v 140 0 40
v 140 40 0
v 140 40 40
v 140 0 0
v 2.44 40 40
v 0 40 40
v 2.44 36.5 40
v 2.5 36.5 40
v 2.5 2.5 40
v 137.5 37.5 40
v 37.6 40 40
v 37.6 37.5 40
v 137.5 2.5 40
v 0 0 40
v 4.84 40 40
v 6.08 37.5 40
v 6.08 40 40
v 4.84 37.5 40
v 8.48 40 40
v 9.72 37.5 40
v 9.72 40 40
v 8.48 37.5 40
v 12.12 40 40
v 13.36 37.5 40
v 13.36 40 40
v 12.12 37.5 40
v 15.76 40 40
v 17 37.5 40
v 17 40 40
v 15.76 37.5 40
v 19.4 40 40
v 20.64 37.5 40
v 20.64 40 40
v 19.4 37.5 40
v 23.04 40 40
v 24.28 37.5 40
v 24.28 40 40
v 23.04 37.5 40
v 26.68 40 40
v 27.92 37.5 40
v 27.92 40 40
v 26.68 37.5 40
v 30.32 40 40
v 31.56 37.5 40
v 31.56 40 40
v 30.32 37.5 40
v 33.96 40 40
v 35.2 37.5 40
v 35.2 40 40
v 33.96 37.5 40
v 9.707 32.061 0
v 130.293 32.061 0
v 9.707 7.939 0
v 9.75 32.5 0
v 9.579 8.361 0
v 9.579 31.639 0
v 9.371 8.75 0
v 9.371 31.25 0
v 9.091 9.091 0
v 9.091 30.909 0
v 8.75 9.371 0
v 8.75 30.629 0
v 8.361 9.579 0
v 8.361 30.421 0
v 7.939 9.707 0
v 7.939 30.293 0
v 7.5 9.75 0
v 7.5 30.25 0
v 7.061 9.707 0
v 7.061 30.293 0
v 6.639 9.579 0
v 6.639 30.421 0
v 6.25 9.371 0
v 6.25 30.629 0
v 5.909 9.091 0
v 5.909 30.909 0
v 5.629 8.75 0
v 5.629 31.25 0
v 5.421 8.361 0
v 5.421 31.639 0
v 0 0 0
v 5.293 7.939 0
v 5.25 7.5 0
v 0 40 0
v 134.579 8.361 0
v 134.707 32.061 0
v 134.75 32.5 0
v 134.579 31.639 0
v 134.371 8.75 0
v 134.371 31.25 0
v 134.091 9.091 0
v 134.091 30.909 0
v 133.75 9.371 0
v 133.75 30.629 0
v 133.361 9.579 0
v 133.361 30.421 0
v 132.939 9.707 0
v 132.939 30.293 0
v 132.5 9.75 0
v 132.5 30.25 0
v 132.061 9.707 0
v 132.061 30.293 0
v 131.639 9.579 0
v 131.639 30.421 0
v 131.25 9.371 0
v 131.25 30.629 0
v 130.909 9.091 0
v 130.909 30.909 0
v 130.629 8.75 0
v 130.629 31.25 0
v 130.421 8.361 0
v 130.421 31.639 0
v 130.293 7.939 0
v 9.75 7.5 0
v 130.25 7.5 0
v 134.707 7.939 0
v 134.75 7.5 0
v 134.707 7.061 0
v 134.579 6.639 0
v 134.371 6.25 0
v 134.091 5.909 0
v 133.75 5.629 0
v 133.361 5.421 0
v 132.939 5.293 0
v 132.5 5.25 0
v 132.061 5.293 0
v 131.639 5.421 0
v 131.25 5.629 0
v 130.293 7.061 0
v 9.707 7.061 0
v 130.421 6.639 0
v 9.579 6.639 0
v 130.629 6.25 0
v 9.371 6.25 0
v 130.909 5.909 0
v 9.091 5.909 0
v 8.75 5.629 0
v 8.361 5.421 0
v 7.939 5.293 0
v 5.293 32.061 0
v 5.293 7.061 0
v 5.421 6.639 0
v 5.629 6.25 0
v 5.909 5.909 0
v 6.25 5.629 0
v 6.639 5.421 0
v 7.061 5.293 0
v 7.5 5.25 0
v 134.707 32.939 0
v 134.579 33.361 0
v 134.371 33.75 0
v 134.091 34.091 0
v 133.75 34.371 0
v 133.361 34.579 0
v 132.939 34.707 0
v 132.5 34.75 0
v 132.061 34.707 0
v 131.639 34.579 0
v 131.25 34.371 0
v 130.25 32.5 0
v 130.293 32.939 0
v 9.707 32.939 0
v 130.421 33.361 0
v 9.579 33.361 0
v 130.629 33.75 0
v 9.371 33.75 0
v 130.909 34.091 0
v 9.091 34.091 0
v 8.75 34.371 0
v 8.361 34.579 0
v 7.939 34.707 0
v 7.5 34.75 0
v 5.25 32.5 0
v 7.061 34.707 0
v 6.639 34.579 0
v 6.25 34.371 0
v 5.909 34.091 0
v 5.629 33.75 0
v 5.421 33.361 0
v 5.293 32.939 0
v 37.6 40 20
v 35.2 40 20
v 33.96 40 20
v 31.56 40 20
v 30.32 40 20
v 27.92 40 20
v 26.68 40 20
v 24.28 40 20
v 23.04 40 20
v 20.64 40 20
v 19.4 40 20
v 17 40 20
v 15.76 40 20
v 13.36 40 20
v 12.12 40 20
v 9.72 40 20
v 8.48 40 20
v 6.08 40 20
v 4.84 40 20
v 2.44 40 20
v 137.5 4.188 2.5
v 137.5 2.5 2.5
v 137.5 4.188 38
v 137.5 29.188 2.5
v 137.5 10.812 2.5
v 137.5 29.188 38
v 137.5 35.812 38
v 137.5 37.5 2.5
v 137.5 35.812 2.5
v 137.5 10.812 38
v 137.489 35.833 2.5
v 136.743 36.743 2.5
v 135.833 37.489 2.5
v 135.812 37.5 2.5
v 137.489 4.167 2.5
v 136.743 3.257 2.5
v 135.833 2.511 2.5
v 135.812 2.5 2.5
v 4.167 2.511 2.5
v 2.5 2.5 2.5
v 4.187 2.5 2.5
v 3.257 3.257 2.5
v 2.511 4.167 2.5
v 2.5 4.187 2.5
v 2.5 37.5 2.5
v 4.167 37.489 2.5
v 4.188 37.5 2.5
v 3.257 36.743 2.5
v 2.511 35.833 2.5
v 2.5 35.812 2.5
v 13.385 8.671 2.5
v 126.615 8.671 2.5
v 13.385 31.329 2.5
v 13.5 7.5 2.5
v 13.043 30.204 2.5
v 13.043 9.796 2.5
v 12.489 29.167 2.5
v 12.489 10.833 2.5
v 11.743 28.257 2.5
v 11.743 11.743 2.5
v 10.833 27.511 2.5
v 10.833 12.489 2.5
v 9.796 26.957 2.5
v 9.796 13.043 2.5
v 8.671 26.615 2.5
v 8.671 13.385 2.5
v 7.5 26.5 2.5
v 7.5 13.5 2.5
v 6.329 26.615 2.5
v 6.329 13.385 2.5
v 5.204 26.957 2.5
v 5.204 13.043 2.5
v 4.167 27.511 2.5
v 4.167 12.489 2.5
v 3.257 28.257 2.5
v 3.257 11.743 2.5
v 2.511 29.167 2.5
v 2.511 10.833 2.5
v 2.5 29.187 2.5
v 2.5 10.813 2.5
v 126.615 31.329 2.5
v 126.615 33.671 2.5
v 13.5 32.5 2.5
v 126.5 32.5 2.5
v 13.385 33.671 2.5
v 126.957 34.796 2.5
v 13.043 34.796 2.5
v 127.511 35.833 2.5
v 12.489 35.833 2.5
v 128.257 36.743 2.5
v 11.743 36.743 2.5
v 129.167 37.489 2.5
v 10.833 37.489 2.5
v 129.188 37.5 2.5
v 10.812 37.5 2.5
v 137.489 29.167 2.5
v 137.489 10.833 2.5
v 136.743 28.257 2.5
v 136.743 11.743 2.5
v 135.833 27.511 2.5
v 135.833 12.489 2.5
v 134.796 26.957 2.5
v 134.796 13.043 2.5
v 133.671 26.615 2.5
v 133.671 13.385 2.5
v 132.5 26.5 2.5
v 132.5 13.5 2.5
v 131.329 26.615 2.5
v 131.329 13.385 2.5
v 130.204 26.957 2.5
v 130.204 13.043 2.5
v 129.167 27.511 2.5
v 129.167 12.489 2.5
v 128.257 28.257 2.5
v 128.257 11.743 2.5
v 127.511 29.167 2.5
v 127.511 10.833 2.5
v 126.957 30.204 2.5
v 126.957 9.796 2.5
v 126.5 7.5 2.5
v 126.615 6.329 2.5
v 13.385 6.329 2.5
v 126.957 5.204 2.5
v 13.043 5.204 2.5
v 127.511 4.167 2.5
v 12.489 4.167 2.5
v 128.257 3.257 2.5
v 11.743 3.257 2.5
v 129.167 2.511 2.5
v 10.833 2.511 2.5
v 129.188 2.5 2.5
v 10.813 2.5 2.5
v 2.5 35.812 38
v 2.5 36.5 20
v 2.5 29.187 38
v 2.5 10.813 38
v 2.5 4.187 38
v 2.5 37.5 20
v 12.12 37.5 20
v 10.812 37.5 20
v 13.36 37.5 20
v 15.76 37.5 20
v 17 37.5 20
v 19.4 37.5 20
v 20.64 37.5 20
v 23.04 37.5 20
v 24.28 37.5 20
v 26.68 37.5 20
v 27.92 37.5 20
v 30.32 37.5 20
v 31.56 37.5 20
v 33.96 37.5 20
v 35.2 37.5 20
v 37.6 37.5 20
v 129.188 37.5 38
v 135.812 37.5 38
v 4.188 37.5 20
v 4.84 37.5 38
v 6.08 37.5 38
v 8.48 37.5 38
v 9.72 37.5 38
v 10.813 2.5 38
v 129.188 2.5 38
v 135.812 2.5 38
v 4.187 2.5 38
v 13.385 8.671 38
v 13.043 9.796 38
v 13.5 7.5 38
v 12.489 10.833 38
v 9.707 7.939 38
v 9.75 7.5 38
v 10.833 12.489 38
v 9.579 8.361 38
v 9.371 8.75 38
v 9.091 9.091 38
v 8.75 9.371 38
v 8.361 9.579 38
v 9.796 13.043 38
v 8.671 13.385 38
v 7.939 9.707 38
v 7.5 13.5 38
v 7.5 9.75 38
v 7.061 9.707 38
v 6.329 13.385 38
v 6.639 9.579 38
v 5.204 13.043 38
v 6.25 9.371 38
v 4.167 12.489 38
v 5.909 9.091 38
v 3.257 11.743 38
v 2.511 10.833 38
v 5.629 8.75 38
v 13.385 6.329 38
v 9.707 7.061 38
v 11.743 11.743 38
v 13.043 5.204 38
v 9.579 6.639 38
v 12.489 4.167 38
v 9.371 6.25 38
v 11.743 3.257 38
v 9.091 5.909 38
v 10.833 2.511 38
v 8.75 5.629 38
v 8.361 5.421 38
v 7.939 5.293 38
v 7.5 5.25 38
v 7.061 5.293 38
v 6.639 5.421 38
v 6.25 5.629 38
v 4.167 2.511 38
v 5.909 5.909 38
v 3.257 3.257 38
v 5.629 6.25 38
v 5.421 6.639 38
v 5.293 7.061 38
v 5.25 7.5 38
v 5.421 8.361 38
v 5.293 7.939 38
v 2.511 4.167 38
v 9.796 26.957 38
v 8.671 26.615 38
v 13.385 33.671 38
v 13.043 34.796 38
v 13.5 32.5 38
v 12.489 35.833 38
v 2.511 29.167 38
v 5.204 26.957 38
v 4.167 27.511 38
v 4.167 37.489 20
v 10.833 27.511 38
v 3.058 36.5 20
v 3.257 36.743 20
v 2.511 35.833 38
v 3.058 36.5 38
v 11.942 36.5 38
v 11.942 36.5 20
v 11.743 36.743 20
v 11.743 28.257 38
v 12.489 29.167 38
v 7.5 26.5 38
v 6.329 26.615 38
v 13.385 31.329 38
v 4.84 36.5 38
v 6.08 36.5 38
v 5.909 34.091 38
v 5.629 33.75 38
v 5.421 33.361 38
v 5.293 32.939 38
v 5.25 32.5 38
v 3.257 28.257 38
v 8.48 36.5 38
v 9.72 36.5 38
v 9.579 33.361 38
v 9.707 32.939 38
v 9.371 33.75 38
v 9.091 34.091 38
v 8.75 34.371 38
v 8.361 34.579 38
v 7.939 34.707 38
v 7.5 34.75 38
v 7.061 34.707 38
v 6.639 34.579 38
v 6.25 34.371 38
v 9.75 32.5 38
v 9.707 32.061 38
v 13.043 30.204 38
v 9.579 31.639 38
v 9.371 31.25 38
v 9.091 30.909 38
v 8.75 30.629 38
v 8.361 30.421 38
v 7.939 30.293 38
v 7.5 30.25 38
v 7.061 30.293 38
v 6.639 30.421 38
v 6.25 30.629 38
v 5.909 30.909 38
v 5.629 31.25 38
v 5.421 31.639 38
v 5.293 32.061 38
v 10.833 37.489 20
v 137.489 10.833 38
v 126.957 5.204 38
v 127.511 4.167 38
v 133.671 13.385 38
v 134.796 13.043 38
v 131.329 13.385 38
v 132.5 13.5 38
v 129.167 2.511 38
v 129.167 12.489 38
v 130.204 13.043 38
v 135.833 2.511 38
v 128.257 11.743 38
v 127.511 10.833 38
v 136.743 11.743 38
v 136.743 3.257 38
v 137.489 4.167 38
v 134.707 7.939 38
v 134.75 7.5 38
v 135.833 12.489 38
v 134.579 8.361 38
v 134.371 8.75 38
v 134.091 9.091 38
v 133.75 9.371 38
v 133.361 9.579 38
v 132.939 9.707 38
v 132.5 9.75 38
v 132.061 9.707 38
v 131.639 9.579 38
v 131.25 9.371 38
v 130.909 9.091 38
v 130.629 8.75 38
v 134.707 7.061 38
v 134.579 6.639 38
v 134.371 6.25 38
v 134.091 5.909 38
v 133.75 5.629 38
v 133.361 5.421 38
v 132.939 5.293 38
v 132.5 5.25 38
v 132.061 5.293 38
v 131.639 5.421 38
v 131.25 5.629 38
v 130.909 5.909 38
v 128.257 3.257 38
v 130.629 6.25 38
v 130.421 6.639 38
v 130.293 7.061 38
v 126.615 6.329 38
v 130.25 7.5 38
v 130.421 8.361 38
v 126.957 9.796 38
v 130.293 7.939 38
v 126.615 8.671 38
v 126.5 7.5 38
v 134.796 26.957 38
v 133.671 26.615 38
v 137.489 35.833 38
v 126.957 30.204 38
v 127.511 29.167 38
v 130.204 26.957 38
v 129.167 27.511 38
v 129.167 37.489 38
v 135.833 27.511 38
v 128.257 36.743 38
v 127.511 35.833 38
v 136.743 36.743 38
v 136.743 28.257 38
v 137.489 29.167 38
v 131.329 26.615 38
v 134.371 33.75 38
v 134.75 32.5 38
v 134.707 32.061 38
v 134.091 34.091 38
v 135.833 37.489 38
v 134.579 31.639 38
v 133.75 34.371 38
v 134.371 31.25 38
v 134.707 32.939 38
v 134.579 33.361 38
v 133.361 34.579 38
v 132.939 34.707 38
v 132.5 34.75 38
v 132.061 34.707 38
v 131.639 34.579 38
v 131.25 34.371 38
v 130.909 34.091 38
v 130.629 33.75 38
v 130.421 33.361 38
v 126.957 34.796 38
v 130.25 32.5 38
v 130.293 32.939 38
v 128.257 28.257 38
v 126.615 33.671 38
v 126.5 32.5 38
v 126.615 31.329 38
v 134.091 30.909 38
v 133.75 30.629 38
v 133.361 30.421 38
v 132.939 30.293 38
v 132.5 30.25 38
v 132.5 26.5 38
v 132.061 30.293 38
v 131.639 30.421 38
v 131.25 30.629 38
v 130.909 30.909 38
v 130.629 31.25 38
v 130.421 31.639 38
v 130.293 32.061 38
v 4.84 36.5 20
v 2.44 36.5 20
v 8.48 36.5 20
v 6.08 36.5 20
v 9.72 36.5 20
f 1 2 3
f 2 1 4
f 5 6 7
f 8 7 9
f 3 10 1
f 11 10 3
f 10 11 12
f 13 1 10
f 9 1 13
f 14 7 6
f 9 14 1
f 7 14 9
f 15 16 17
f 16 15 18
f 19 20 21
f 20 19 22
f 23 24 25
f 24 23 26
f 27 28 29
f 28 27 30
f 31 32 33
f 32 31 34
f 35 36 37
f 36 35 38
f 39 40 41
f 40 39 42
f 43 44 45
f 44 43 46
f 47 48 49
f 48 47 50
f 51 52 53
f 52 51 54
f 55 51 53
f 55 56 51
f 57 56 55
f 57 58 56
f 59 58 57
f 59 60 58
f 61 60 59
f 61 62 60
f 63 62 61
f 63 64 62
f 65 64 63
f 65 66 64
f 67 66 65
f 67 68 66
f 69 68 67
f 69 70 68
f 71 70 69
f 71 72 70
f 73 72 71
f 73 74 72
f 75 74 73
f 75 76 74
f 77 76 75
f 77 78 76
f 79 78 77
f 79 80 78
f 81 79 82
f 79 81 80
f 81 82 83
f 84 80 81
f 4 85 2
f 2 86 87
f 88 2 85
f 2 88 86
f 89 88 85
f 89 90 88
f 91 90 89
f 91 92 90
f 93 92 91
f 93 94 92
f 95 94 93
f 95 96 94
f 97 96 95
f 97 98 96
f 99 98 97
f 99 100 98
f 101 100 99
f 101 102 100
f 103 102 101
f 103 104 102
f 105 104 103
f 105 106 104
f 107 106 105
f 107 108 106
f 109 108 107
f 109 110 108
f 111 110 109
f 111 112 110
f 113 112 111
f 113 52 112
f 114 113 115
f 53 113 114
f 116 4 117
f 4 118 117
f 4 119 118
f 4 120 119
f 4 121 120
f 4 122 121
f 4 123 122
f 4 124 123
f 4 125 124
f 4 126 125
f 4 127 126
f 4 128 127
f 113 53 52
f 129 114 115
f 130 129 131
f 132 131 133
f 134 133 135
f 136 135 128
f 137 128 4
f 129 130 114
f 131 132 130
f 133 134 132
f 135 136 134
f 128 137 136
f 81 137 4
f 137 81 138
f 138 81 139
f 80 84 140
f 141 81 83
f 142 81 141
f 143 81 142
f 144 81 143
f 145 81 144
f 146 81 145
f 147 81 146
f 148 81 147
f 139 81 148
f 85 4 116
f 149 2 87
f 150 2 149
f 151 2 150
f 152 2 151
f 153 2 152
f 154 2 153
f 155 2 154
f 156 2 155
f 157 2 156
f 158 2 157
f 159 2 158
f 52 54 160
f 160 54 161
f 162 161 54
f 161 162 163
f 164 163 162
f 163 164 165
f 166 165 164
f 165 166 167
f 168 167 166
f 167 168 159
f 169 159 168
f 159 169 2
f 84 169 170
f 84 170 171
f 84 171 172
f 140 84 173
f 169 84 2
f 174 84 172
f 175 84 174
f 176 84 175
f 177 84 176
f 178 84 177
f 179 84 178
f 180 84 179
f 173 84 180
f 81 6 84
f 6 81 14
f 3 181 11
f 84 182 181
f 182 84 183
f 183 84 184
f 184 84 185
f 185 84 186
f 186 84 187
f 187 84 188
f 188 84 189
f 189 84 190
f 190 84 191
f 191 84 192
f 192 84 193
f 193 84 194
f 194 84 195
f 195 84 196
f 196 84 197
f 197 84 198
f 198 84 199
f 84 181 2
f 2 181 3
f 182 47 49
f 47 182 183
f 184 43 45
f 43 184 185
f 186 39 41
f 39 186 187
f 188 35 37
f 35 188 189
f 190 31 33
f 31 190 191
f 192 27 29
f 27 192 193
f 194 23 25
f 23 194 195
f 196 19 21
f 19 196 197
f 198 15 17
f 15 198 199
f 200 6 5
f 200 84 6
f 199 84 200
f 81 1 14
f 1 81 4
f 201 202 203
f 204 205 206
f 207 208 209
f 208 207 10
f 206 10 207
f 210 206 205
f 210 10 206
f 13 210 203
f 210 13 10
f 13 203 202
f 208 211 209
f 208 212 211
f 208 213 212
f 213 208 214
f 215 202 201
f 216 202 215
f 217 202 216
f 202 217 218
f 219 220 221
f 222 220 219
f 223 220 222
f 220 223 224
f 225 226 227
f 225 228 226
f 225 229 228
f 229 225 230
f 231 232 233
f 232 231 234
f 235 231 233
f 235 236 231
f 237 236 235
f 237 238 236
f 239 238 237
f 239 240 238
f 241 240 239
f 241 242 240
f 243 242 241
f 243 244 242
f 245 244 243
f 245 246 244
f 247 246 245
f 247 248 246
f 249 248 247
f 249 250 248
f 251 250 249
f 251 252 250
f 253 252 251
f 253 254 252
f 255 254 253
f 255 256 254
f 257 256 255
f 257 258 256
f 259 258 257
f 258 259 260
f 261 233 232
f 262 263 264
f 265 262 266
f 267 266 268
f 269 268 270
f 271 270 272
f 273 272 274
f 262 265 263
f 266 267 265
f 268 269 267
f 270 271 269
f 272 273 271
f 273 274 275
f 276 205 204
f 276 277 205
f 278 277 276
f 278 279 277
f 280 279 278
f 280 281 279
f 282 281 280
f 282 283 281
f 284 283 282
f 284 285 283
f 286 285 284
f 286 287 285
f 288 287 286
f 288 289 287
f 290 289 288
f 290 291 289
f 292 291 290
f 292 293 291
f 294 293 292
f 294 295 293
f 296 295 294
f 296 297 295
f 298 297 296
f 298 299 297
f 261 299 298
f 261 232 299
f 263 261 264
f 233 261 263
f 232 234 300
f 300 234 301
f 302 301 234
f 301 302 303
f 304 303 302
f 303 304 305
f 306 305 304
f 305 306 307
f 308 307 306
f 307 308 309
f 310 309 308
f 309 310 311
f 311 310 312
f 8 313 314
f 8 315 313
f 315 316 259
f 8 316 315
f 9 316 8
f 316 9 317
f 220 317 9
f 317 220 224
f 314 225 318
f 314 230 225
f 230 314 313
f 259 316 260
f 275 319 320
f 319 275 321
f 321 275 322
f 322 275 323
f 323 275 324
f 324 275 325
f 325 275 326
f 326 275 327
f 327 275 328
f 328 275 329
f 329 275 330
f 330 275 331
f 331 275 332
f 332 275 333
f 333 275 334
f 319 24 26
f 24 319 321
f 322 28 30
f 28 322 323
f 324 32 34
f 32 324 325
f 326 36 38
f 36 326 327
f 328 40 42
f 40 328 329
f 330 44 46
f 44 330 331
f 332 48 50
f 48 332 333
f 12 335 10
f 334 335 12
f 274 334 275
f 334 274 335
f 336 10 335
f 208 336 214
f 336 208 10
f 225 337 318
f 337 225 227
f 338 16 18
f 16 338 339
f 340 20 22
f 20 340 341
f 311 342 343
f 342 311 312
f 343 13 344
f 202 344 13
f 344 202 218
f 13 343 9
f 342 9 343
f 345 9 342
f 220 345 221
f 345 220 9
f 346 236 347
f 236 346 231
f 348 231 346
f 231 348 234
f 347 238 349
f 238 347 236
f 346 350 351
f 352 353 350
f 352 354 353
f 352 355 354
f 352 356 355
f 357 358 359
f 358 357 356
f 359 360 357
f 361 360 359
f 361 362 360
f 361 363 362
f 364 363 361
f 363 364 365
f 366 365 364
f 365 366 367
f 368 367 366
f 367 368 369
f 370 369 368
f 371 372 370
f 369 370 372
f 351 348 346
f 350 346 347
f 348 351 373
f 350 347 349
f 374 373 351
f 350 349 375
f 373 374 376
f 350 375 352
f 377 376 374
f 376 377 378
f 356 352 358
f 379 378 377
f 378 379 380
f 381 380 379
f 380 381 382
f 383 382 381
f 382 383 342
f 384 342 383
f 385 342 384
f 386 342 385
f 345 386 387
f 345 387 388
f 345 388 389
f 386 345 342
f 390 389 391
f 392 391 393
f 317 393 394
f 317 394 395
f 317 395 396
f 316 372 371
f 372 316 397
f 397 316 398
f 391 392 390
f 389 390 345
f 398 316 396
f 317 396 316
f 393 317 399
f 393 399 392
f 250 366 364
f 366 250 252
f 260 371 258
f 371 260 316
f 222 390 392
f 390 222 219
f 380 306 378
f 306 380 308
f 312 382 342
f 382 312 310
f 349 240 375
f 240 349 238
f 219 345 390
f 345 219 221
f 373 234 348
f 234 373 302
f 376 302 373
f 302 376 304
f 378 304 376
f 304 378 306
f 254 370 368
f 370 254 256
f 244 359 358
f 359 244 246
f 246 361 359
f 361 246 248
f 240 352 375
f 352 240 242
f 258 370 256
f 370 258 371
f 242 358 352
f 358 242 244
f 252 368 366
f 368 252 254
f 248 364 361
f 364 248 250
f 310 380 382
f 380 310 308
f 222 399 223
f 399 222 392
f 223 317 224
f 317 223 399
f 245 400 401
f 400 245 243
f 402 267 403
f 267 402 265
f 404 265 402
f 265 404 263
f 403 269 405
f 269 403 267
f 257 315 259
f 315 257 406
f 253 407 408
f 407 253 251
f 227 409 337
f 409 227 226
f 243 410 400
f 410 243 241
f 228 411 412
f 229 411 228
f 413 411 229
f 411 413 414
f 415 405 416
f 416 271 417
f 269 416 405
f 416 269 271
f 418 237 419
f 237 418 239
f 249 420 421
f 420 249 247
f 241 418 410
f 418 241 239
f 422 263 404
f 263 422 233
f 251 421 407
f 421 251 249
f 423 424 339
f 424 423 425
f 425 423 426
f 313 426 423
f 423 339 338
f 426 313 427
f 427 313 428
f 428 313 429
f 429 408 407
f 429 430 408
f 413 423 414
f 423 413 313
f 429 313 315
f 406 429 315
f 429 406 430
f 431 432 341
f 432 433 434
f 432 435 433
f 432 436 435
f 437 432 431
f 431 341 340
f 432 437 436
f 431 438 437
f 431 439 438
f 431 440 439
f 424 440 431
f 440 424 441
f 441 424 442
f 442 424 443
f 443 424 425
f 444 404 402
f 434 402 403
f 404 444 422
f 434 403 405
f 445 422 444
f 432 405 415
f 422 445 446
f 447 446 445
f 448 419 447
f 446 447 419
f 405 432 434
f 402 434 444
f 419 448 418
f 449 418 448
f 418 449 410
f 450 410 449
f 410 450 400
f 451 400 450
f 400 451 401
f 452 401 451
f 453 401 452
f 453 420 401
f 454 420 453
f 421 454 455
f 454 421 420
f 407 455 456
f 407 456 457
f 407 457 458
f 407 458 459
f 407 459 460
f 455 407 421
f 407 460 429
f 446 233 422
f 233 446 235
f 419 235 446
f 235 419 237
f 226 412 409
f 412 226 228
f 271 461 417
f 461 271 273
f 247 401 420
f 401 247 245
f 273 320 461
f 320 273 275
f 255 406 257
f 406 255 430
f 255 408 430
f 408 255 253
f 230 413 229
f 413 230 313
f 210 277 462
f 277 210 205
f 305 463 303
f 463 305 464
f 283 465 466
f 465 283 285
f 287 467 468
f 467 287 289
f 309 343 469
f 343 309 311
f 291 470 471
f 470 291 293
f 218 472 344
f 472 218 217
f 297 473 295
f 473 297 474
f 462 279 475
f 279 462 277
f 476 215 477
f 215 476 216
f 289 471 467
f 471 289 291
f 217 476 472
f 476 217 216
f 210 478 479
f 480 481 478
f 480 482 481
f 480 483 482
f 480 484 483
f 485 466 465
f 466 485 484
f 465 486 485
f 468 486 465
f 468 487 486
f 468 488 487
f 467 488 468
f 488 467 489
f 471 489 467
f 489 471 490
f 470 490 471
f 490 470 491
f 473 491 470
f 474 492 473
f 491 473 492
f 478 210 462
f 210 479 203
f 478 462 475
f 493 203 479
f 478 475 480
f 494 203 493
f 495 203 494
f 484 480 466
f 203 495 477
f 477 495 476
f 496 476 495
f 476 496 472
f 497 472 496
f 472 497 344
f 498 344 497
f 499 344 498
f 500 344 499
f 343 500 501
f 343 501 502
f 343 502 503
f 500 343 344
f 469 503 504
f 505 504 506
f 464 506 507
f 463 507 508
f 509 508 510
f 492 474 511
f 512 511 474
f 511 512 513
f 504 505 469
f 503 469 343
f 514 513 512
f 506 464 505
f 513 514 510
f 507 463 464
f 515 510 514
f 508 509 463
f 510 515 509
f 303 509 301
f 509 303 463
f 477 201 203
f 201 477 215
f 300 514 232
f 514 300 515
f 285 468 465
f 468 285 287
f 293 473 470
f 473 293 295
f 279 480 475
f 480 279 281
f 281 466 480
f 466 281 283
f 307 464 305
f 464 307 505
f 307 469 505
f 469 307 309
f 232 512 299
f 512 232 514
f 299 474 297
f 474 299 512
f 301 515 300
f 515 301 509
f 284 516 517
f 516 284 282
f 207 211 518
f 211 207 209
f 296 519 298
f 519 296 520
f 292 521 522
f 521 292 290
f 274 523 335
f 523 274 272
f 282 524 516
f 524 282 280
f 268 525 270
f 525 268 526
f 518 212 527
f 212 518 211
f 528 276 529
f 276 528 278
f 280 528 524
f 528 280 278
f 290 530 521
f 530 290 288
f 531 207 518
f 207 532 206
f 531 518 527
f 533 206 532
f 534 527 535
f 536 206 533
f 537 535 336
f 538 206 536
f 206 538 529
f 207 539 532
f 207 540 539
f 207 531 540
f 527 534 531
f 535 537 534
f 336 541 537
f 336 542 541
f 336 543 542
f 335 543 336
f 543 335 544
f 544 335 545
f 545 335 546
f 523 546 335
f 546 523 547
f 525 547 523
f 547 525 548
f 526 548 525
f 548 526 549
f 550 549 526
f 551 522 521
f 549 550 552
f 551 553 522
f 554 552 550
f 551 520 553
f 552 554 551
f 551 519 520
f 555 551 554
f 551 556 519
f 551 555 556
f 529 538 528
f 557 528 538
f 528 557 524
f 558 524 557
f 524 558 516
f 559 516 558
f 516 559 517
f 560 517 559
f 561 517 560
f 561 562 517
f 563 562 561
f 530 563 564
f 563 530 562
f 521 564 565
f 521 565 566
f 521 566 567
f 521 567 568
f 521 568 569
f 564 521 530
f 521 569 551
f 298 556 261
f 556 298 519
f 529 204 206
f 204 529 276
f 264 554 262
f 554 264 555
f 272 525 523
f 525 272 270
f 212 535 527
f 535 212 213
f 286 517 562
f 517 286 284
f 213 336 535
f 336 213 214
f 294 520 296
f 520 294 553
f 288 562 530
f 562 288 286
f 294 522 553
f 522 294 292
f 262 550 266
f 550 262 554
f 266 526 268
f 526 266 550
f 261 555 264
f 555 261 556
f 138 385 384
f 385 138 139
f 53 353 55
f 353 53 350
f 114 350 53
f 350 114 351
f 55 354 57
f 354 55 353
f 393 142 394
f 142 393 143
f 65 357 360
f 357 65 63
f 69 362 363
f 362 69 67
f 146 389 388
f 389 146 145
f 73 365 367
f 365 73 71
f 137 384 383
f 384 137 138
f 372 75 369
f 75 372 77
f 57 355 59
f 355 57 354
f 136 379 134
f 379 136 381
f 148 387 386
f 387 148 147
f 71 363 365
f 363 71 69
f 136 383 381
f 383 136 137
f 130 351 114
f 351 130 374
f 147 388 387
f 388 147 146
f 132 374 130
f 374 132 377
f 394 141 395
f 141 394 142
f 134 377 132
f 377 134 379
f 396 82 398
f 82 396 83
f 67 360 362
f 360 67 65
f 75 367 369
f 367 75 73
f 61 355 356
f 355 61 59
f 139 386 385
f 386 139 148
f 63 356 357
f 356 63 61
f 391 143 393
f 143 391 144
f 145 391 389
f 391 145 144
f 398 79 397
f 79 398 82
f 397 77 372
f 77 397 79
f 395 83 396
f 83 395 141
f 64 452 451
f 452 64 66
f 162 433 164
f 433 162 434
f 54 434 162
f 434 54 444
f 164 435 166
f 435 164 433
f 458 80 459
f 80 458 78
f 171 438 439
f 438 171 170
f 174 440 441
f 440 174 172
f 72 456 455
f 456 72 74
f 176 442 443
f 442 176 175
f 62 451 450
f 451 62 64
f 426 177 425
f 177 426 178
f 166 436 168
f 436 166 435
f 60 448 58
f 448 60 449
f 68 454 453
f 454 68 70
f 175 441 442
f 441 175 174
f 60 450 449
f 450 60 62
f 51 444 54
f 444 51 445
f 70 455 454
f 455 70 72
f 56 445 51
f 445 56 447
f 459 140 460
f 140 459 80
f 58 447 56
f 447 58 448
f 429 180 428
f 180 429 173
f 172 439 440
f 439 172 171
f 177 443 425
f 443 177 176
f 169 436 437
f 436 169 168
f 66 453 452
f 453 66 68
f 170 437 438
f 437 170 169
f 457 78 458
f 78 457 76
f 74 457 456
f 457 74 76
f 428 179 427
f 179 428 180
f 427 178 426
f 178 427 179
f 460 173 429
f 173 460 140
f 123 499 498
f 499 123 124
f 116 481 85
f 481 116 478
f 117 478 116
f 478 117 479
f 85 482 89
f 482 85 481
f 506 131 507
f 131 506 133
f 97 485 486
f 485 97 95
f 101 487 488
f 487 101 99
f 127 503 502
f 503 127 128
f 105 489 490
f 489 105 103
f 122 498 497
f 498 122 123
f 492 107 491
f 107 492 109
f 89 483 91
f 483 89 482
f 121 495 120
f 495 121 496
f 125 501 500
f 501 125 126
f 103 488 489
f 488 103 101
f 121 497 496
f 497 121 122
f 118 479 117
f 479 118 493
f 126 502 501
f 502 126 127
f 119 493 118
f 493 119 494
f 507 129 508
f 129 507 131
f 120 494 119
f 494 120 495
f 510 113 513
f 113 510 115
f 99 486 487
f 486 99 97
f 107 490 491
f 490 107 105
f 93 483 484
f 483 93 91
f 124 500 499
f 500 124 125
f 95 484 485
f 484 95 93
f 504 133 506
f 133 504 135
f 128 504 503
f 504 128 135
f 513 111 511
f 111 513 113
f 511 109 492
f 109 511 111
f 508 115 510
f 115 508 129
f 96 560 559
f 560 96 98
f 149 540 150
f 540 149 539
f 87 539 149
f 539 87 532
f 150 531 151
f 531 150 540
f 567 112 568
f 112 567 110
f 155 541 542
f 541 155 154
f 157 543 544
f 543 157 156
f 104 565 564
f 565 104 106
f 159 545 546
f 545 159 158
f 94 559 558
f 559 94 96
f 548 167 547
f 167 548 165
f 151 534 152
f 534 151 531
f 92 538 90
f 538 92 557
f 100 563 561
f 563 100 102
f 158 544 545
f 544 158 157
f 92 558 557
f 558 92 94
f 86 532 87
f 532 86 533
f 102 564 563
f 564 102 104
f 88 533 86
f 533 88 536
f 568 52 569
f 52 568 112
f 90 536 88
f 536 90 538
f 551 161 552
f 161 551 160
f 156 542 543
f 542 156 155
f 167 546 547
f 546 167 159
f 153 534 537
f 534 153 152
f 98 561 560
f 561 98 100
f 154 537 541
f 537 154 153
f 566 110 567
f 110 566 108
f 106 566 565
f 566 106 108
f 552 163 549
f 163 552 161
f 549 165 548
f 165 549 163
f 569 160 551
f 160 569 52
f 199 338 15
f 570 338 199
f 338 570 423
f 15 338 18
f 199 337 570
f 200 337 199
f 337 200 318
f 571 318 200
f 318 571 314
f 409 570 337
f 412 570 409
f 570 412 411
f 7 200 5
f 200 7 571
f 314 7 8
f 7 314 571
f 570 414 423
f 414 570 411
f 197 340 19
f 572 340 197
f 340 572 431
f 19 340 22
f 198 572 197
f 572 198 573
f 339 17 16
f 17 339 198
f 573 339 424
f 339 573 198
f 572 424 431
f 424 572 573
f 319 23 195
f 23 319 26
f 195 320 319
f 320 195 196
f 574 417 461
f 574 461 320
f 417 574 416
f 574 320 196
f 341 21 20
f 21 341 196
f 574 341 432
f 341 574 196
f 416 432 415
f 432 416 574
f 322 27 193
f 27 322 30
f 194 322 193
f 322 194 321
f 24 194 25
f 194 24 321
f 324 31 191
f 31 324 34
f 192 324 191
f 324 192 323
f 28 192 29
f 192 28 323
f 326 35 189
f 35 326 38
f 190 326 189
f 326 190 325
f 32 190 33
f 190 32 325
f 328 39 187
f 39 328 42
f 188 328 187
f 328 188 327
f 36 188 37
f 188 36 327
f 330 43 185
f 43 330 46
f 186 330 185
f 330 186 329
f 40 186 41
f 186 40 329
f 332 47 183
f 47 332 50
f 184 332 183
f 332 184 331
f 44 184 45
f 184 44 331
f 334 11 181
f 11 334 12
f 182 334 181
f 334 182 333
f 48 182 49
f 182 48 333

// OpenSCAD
$fn = 32;

// ----------------------------------------------------------------------
// Enclosure body: 140 x 40 x 40 mm, wall 2.5 mm
// ----------------------------------------------------------------------

// --- parameters (mm) ---
length = 140;             // outside length, X
width = 40;               // outside width, Y
height = 40;              // outside height, Z
wall = 2.5;               // side wall thickness
floor_t = 2.5;            // floor thickness
boss_d = 12;              // corner boss diameter
boss_h = 35.5;            // corner boss height above the floor
boss_hole_d = 4.5;        // lid screw clearance in the boss
boss_lip = 7.5;           // boss centre inset from the corner
vent_slots = 10;          // vent slots in the long wall
vent_w = 2.4;             // vent slot width
vent_h = 20;              // vent slot height
vent_pitch = 3.64;        // vent slot pitch
vent_z = 20;              // vent slot sill height

module shell() {
  difference() {
    cube([length, width, height]);
    /* hollow, open at the top */
    translate([wall, wall, floor_t])
      cube([length - 2 * wall, width - 2 * wall, height]);
  }
}

module bosses() {
  /* corner bosses, sunk 1 mm into the floor */
  for (sx = [0, 1]) for (sy = [0, 1])
    translate([sx * (length - 2 * boss_lip) + boss_lip, sy * (width - 2 * boss_lip) + boss_lip, floor_t - 1])
      cylinder(h = boss_h + 1, d = boss_d);
}

difference() {
  union() {
    shell();
    bosses();
  }
  /* boss screw holes */
  for (sx = [0, 1]) for (sy = [0, 1])
    translate([sx * (length - 2 * boss_lip) + boss_lip, sy * (width - 2 * boss_lip) + boss_lip, -1]) cylinder(h = floor_t + boss_h + 2, d = boss_hole_d);
  /* vent grille in the +Y wall */
  for (i = [0 : vent_slots - 1]) translate([vent_pitch * (i + 1) - vent_w / 2, width - wall - 1, vent_z]) cube([vent_w, wall + 2, vent_h]);
}
